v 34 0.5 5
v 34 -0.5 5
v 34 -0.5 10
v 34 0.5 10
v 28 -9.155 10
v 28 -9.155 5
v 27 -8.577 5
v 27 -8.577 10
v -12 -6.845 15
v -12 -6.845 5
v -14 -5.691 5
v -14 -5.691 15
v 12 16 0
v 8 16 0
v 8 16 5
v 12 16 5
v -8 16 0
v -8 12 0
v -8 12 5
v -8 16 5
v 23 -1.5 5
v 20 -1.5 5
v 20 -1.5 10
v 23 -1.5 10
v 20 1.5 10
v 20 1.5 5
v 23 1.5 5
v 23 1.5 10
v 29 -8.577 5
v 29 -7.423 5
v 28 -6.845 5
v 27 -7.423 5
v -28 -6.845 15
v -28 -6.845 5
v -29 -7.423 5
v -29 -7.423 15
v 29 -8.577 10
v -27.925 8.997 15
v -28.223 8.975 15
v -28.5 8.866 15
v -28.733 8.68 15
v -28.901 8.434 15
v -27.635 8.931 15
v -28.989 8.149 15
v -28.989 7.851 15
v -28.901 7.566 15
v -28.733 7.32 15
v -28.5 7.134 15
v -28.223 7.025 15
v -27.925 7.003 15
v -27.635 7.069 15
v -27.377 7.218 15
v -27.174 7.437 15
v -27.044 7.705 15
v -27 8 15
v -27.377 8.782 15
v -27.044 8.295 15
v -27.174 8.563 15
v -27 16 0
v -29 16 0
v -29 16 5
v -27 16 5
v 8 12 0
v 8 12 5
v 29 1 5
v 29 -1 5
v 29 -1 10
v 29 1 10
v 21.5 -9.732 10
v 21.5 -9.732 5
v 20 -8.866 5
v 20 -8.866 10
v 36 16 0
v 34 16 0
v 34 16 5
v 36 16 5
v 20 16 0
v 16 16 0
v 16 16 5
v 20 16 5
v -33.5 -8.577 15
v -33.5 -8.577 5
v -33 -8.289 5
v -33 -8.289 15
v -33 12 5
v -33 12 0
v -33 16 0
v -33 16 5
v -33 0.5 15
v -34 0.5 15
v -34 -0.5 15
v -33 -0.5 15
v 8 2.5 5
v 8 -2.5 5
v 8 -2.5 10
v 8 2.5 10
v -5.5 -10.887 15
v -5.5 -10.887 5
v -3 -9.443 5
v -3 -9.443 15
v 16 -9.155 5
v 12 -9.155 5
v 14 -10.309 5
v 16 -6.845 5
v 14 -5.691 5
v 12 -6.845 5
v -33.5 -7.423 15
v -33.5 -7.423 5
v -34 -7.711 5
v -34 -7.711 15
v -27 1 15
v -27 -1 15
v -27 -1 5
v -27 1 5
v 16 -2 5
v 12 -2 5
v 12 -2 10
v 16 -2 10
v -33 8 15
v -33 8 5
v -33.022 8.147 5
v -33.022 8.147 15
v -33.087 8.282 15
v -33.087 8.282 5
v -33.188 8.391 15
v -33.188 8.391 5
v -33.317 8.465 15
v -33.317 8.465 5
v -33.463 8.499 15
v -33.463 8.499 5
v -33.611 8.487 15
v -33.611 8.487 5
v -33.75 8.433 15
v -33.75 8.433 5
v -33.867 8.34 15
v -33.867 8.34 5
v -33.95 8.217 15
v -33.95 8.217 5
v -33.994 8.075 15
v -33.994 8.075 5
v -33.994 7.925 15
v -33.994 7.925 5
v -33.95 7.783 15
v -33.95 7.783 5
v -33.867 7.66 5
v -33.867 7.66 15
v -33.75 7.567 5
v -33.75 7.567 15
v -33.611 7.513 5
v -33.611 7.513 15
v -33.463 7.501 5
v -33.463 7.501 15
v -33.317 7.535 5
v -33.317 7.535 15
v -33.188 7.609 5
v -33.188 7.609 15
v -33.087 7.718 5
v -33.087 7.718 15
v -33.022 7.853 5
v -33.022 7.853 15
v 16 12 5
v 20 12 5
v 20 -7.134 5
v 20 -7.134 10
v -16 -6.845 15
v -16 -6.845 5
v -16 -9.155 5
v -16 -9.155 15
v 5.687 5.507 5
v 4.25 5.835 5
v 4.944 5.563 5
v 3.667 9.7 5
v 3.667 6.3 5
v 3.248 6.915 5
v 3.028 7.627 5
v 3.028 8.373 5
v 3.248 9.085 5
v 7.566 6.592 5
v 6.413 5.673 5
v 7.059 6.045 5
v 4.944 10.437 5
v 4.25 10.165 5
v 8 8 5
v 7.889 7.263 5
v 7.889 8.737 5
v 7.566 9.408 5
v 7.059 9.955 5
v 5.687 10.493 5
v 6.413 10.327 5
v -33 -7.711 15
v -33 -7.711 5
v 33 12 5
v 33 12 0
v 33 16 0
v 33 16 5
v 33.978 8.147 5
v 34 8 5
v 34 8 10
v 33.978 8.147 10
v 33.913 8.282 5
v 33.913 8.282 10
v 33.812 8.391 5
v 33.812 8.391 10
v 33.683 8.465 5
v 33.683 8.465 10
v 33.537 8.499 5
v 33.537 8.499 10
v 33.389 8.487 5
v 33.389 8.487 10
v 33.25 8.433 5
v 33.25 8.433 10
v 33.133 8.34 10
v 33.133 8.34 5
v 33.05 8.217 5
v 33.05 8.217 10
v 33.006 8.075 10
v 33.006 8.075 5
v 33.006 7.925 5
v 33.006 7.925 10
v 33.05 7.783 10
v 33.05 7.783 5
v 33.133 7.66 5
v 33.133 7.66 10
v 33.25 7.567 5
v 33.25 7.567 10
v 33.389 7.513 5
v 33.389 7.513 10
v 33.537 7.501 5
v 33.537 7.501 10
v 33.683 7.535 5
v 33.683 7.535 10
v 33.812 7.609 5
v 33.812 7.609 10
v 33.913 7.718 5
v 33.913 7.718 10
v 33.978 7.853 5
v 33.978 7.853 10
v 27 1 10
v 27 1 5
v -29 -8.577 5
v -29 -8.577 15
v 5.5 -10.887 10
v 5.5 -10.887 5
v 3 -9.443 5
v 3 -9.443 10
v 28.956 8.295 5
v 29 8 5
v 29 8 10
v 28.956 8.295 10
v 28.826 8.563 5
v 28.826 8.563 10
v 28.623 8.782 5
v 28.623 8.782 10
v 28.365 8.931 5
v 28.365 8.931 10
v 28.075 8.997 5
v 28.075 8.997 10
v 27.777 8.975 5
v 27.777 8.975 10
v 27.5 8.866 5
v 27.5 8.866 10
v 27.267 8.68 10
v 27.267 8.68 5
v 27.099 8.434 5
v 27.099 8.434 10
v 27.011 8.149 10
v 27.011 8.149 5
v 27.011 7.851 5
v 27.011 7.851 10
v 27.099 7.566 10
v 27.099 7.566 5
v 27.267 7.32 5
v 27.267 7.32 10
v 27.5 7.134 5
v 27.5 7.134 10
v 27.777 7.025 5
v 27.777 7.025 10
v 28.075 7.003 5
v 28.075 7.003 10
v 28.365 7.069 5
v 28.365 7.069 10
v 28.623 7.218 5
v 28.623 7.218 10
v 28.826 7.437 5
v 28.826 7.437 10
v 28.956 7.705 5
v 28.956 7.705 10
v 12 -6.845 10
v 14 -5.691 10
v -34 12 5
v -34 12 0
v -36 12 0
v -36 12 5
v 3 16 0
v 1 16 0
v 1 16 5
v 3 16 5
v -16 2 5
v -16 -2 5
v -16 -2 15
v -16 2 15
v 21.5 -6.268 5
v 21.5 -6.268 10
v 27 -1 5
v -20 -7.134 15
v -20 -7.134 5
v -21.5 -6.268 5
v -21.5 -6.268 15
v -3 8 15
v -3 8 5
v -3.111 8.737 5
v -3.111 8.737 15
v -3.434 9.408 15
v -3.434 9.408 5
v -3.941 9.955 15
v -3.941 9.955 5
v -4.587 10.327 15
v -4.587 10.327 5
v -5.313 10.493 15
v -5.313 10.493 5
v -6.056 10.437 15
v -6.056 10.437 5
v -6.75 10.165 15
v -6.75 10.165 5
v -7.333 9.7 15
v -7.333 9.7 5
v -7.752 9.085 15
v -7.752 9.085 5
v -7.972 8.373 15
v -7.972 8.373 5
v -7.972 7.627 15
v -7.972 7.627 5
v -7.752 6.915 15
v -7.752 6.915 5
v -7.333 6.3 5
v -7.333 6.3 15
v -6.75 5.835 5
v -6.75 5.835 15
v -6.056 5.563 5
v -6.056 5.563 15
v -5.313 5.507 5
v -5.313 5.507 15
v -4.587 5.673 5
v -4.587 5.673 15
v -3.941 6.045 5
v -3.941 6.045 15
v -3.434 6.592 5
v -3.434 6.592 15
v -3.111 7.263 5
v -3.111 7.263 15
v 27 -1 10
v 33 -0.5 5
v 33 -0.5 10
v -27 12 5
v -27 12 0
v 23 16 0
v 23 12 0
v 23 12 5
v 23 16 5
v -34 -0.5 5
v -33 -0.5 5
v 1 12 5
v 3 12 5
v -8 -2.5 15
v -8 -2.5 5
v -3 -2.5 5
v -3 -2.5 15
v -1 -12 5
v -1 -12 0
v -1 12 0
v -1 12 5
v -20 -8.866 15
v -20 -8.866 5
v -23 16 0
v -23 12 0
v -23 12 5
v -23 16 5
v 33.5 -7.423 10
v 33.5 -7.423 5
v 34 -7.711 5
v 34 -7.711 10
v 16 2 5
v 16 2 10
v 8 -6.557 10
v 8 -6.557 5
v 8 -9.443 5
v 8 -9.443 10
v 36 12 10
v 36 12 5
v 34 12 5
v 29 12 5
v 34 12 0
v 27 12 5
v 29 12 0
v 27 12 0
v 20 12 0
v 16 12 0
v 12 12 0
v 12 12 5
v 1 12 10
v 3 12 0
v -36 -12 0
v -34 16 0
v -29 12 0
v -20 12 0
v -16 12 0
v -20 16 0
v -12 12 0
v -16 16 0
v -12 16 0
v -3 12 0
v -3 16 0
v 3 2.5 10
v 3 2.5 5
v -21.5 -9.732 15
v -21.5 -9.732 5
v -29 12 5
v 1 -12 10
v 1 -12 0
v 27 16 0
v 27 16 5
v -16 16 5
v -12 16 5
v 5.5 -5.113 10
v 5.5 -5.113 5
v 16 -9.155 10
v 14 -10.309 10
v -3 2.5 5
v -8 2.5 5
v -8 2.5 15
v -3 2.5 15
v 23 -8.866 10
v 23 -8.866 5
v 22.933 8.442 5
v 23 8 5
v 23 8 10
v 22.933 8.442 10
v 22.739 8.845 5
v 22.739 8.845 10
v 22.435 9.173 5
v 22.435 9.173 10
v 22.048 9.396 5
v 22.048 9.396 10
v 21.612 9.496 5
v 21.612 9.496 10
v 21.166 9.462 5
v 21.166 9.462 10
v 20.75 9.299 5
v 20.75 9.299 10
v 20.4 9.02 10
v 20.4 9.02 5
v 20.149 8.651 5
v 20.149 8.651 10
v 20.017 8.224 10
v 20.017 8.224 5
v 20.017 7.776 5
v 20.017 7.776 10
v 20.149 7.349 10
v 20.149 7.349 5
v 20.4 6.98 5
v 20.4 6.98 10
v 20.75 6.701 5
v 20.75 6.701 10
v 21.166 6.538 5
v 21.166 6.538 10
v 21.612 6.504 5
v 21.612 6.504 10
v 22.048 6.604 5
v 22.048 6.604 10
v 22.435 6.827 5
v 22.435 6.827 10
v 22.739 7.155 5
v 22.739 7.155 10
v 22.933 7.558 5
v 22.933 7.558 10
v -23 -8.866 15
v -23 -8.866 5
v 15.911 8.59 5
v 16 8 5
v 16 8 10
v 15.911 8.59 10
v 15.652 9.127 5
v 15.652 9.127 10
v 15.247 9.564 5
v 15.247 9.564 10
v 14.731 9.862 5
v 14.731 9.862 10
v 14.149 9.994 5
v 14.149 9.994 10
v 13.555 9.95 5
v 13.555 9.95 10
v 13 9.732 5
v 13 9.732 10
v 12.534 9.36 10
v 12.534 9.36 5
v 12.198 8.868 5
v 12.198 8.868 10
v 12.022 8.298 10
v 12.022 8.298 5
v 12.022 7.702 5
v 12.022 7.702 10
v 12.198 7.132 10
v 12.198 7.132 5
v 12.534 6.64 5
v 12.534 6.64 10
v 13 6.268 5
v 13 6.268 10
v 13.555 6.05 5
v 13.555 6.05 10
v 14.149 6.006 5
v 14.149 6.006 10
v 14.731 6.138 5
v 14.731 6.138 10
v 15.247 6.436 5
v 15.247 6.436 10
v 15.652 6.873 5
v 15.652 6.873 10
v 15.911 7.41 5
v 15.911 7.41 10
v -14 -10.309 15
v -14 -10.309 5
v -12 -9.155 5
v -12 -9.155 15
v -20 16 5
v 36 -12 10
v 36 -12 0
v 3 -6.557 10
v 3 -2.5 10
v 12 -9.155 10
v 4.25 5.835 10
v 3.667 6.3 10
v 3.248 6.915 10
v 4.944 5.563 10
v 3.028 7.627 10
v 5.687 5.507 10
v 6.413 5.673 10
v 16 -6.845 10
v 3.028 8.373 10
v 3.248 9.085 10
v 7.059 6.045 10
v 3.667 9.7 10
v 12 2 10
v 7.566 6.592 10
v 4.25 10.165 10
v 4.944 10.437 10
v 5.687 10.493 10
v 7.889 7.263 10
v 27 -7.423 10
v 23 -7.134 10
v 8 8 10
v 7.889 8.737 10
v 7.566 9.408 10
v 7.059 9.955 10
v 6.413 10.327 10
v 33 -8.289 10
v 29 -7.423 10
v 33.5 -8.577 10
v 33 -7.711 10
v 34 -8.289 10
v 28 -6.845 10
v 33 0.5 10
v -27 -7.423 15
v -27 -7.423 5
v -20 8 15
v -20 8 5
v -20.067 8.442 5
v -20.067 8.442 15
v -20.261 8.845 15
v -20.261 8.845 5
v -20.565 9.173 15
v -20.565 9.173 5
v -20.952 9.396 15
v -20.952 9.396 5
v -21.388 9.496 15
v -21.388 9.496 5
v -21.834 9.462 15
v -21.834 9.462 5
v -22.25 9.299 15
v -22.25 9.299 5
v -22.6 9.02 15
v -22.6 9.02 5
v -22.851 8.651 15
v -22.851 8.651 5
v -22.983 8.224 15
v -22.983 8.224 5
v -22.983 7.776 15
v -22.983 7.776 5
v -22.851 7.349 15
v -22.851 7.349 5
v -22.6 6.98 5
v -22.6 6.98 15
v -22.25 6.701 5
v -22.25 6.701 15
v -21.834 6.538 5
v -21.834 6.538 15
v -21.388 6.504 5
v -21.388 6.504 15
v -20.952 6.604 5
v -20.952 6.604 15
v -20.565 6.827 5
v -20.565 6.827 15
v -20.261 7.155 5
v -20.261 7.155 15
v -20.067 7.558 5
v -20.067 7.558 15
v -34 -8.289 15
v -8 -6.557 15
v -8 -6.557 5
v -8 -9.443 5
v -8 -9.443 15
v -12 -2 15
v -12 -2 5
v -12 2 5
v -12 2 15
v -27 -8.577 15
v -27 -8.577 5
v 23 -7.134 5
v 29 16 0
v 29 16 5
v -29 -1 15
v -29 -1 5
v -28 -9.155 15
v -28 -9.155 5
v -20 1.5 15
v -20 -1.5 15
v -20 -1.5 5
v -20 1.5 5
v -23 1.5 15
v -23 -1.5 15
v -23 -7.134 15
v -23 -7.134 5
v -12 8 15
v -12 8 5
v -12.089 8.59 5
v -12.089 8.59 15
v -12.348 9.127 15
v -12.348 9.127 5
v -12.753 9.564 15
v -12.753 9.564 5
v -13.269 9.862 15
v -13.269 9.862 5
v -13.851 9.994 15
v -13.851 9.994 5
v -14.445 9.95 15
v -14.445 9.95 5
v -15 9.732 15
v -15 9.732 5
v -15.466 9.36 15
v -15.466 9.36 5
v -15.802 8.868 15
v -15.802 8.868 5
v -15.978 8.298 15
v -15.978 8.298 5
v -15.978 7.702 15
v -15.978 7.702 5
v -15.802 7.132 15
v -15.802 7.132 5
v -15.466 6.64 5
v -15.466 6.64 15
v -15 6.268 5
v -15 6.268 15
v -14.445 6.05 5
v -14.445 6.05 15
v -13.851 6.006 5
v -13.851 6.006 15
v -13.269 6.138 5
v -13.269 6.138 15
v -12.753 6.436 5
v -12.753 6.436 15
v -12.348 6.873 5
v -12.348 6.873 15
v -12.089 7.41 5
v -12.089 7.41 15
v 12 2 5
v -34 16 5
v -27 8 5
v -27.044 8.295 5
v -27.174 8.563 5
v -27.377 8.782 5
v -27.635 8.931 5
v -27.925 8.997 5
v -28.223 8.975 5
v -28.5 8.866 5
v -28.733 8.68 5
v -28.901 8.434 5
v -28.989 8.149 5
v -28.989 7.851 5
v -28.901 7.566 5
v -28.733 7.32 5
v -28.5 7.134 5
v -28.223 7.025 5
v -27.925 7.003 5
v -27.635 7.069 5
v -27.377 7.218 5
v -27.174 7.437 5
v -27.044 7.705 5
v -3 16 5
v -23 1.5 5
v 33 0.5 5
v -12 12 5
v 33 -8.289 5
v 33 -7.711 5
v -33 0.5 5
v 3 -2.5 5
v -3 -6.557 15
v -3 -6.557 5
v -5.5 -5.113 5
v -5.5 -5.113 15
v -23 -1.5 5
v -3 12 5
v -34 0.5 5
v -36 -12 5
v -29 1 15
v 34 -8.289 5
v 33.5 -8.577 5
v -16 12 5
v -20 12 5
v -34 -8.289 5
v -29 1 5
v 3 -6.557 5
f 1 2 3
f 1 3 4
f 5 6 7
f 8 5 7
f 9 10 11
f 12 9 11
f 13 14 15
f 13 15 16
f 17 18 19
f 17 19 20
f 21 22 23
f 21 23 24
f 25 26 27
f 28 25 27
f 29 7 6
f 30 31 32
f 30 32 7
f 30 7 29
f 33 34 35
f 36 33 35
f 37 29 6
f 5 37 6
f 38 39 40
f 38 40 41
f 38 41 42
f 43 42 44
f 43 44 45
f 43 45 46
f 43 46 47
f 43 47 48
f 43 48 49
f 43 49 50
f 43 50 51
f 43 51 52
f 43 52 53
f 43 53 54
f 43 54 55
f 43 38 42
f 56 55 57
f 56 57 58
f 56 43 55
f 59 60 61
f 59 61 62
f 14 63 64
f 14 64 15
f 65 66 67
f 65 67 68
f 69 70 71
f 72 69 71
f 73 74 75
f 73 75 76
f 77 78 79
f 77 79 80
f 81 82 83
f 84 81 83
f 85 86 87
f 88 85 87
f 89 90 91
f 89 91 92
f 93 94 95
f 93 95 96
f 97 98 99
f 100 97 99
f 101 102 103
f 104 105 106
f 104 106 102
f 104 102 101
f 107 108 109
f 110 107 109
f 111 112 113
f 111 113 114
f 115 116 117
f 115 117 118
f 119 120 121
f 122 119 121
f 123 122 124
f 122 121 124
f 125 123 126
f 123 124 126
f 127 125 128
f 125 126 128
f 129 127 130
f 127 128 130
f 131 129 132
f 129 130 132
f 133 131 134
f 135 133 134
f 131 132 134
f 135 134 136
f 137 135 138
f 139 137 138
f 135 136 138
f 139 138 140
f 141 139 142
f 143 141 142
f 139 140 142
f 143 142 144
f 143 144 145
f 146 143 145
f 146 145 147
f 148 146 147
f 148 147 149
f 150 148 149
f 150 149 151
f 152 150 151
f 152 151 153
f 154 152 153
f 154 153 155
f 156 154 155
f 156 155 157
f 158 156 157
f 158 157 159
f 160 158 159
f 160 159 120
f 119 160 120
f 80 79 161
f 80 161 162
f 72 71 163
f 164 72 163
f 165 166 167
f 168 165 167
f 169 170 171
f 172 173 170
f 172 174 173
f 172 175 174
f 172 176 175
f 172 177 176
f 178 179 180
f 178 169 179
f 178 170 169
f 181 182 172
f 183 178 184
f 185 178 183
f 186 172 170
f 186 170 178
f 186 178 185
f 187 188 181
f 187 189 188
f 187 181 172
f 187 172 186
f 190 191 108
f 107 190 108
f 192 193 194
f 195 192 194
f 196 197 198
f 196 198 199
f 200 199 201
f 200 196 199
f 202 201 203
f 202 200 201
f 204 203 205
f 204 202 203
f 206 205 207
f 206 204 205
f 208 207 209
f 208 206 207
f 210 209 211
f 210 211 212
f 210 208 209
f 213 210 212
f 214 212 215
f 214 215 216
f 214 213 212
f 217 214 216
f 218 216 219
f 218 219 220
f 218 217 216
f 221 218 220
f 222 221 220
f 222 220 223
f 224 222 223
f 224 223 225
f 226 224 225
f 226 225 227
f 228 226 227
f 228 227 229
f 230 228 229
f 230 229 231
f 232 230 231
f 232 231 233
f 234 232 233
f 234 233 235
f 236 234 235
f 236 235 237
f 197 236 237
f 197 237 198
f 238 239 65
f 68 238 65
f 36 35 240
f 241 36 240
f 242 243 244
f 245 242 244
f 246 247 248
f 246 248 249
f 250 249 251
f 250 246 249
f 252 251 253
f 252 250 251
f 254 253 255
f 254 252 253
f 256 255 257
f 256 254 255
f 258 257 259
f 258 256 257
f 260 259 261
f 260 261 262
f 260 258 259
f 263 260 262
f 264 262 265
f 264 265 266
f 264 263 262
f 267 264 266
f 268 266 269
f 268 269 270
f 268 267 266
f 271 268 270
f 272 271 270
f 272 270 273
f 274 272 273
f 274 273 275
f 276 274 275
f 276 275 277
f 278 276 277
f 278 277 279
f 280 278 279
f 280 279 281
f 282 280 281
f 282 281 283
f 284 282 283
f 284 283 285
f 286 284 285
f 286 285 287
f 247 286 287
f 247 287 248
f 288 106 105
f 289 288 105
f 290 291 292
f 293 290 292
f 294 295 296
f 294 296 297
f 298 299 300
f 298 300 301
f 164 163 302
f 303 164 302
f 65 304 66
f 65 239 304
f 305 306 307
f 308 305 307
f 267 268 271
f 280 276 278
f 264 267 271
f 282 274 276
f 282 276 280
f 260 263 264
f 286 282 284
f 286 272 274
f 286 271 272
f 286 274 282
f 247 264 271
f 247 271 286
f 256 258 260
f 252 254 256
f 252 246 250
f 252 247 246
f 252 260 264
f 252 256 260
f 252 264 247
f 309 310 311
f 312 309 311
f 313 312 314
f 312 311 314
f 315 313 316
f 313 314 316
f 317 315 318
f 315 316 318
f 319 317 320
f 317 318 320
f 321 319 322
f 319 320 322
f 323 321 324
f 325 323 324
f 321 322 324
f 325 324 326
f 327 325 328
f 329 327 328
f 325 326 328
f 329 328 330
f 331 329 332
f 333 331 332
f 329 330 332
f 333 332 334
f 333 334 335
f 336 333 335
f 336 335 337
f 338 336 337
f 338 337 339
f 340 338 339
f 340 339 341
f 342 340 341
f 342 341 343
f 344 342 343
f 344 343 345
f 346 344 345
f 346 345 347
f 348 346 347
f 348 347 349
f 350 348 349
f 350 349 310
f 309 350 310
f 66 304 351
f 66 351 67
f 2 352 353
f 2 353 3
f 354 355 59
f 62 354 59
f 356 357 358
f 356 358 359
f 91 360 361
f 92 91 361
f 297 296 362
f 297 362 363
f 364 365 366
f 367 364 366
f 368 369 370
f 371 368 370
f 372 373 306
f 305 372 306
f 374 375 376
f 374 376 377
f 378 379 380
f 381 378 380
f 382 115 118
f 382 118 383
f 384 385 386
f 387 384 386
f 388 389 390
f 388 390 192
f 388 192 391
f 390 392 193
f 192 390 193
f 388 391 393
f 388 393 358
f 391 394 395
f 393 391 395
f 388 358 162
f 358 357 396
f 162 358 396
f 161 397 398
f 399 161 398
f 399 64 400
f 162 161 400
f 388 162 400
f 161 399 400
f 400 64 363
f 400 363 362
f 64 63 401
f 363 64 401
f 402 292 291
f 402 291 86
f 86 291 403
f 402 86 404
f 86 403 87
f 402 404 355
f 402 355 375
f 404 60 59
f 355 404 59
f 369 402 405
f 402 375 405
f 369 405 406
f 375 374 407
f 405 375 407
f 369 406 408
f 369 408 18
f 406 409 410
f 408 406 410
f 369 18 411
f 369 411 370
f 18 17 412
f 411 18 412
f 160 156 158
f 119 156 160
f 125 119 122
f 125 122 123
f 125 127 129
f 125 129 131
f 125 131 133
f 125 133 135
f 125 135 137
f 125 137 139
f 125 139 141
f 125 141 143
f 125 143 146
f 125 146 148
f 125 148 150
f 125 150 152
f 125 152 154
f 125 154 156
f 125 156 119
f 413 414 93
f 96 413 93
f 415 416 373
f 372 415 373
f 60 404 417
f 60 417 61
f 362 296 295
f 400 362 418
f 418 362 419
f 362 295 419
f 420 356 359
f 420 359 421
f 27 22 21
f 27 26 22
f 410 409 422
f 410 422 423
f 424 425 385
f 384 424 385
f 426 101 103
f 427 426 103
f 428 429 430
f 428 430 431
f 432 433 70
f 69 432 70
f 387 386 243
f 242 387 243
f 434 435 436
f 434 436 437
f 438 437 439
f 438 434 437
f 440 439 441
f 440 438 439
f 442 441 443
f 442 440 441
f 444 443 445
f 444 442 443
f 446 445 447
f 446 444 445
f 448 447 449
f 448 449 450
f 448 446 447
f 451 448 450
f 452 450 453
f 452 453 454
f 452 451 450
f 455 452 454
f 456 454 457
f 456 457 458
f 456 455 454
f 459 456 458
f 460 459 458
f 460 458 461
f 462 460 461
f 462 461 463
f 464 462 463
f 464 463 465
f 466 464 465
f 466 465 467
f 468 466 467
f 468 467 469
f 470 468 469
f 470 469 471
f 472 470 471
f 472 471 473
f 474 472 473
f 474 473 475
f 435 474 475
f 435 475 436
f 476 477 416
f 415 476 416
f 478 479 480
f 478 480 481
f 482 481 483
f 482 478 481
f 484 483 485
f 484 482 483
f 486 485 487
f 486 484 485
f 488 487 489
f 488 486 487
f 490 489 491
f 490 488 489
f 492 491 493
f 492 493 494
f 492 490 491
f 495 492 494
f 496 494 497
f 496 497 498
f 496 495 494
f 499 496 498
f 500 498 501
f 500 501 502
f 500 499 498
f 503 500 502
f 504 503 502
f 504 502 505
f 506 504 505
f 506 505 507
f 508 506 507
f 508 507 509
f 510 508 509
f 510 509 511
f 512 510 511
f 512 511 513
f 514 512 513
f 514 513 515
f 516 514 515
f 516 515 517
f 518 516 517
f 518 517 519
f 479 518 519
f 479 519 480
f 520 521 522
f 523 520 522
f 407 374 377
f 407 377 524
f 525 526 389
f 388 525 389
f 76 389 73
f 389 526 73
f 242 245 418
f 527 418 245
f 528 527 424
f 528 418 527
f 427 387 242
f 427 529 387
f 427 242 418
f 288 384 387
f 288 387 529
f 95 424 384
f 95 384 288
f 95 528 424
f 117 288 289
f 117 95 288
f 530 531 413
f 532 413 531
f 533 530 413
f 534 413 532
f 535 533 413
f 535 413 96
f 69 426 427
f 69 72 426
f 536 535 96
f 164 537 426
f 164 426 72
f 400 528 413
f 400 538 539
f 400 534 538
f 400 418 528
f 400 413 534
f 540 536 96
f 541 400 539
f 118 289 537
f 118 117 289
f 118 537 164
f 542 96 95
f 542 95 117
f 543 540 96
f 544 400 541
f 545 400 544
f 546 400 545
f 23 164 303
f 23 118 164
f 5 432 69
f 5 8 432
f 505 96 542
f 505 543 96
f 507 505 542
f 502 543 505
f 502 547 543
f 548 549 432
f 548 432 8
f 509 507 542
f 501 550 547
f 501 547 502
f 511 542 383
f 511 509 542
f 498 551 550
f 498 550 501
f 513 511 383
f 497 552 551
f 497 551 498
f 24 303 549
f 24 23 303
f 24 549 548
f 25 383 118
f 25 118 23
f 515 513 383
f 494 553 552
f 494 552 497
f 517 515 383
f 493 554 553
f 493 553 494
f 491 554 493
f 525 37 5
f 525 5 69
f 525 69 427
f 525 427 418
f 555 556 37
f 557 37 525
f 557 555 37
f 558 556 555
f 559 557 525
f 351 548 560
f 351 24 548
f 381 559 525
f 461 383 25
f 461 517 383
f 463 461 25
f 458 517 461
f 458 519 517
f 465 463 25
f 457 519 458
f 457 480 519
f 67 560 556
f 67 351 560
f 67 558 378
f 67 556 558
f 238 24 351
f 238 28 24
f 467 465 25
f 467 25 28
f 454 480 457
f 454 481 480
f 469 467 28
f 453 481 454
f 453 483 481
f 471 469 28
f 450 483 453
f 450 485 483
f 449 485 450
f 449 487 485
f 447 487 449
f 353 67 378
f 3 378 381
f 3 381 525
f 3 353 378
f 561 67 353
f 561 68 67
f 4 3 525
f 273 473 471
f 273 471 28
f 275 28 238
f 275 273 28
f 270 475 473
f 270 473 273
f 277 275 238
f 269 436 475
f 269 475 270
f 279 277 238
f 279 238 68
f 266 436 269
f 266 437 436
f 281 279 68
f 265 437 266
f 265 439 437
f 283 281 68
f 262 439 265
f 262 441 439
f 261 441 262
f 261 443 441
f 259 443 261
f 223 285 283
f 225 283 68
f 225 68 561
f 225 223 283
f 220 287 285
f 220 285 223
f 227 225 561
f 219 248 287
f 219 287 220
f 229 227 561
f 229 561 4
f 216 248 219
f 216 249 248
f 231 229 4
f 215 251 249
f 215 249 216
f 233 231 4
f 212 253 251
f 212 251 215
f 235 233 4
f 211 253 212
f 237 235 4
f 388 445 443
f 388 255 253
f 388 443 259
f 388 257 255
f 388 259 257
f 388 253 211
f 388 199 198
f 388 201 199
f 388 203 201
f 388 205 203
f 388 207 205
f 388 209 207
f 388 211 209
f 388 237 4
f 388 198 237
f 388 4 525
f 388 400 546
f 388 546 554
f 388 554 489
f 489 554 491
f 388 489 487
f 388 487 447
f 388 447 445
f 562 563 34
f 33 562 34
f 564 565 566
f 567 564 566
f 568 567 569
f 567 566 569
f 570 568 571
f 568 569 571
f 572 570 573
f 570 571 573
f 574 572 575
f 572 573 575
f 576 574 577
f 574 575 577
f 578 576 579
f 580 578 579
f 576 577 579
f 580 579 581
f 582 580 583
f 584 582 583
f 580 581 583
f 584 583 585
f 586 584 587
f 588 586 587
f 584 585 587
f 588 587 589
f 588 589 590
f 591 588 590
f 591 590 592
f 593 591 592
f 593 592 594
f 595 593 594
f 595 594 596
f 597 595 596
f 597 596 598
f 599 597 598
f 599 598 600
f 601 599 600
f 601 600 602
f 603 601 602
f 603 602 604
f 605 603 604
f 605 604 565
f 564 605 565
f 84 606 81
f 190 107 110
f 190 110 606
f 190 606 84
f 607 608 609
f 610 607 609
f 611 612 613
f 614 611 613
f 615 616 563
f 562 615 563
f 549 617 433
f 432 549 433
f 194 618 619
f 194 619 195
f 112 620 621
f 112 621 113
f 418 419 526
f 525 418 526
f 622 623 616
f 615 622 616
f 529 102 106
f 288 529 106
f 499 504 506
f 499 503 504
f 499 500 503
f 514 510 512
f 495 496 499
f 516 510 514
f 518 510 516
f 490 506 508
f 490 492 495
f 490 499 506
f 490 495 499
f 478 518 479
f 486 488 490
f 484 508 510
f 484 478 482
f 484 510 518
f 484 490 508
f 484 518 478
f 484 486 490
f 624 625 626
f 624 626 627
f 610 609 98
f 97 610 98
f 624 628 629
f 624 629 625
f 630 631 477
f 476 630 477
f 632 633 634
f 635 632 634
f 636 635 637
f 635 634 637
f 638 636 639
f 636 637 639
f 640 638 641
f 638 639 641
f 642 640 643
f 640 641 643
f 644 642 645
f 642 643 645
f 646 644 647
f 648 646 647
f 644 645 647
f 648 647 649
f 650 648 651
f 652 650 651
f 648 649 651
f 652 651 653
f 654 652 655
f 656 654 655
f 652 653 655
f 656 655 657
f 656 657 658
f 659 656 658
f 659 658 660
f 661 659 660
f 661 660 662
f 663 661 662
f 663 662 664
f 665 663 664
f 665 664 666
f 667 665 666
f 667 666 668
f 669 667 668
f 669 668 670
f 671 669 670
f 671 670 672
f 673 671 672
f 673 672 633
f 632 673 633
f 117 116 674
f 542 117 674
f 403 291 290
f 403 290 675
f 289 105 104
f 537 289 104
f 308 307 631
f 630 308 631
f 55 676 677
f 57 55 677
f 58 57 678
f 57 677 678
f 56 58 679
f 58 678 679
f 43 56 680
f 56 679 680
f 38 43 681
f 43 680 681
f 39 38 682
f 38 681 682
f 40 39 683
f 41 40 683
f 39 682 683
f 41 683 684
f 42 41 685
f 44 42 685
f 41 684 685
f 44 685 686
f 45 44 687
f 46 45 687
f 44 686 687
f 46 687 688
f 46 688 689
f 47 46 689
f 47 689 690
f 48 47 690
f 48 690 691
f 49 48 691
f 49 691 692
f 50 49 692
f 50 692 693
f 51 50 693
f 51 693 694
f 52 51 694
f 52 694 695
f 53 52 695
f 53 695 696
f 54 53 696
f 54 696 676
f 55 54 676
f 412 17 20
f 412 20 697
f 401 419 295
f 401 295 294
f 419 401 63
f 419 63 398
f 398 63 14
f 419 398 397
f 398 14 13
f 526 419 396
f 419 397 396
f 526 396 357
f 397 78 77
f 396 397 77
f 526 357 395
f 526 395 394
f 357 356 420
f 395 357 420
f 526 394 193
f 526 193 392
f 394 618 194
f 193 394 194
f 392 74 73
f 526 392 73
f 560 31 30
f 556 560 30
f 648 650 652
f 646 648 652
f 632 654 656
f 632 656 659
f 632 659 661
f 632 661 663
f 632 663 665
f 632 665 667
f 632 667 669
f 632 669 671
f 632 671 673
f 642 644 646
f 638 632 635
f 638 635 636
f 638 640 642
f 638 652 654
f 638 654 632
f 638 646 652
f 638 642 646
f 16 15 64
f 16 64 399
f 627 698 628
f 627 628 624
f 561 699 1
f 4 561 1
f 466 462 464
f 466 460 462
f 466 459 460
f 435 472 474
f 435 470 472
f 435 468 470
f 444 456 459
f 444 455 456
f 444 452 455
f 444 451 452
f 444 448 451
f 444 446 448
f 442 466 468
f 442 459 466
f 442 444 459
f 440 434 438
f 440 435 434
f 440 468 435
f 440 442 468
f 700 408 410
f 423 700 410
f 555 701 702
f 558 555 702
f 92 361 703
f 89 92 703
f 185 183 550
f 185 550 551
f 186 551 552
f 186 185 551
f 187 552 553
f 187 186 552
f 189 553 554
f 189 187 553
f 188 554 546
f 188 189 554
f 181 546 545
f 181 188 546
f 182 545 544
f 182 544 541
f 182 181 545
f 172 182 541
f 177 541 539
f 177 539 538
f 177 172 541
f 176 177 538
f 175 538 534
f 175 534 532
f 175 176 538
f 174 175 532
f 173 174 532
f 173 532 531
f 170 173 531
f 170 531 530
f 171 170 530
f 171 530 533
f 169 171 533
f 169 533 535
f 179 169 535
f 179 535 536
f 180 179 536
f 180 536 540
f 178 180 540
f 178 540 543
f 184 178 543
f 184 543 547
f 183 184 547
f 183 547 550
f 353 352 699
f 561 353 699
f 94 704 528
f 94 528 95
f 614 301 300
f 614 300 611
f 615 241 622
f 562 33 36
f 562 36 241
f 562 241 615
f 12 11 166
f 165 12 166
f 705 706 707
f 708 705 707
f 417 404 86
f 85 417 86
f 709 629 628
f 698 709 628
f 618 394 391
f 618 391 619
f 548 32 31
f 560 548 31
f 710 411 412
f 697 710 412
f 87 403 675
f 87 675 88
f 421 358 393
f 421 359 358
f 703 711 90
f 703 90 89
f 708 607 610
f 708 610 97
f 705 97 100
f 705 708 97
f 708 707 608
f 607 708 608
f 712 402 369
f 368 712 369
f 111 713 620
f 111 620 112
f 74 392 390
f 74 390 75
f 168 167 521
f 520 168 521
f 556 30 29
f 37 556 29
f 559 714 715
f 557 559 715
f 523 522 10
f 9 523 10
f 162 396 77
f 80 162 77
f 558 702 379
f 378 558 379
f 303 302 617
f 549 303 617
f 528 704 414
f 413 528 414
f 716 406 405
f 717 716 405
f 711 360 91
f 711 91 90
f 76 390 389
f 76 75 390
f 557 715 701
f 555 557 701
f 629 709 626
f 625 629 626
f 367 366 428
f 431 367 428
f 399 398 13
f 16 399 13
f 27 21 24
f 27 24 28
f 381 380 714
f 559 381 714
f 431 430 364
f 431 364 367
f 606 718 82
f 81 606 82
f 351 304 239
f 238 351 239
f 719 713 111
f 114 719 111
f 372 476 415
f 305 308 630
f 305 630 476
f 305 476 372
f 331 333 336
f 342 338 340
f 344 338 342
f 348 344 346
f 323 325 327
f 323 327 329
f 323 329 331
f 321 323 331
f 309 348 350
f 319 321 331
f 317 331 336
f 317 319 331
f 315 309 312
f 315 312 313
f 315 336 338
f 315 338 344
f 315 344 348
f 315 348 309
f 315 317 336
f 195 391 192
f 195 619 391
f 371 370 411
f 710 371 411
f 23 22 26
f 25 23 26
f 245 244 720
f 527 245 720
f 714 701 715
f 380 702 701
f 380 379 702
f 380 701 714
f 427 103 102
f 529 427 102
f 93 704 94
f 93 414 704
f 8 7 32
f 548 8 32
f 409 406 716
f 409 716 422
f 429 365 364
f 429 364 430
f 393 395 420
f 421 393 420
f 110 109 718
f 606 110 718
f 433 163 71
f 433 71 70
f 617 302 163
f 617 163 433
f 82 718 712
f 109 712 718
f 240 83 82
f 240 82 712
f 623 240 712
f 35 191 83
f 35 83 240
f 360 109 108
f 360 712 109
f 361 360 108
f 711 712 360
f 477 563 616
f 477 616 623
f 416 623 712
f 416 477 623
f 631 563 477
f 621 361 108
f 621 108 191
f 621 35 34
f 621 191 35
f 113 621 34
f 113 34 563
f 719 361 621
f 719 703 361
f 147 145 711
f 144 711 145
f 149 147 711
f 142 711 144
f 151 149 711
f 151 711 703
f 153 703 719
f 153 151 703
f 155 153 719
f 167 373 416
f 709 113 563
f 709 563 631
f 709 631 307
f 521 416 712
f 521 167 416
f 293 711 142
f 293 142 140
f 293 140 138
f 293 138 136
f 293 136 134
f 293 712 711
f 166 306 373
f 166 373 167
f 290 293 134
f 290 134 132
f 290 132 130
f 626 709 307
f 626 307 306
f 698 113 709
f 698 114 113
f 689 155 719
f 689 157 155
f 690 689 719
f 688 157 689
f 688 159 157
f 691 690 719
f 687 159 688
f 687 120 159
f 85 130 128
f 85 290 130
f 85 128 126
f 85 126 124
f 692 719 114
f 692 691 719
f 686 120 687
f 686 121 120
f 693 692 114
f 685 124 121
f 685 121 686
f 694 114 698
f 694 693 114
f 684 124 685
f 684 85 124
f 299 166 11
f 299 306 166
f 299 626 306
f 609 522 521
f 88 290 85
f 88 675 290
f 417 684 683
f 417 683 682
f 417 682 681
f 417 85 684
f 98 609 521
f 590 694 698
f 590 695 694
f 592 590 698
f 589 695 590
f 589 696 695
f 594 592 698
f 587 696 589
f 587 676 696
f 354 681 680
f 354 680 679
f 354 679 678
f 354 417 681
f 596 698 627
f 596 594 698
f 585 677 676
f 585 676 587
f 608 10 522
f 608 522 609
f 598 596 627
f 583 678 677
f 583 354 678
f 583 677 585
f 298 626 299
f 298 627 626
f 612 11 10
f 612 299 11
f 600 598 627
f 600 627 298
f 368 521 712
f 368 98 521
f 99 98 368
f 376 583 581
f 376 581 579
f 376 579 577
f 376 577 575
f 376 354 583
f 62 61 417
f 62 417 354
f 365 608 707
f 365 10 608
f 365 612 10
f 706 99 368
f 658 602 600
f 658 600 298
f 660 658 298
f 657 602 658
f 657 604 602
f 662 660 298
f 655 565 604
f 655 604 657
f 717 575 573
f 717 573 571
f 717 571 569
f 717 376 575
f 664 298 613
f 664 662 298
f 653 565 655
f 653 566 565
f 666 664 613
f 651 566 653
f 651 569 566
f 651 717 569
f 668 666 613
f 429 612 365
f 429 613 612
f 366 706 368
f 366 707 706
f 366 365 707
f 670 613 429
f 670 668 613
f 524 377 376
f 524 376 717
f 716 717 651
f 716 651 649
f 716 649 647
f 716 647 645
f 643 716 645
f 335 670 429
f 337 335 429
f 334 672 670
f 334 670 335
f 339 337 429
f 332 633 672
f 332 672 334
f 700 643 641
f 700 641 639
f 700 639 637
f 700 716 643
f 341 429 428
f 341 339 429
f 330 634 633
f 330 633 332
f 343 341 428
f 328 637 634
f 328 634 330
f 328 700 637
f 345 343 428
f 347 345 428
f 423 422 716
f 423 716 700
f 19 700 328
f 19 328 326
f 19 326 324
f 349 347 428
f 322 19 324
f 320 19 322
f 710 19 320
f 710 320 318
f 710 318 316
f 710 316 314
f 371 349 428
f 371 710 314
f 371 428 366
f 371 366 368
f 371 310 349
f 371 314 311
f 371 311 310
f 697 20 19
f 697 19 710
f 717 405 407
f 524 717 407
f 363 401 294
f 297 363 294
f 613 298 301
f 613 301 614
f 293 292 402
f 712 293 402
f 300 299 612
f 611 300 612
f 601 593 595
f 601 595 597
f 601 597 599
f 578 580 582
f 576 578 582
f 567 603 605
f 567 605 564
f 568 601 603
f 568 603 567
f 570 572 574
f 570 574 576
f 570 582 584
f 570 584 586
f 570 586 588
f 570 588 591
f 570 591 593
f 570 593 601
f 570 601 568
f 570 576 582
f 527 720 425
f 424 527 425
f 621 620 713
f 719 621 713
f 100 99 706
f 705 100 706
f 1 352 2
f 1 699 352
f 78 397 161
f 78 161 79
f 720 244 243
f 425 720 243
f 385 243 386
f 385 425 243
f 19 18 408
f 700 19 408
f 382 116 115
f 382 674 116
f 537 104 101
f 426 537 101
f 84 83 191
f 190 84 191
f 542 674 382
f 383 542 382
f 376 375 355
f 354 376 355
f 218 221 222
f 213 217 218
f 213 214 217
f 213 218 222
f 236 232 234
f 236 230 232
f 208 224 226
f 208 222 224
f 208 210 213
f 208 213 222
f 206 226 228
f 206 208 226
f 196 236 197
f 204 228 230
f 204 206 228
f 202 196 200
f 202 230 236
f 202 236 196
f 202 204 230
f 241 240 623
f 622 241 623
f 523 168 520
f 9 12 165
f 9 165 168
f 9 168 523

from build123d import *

# Parameters (mm, degrees)
F0_W     = 5
F0_H     = 4
F0_W_2   = 4
F0_W_3   = 2
F0_W_4   = 3
F0_W_5   = 1
F0_H_2   = 1
F0_H_3   = 2
F0_H_4   = 3
F0_H_5   = 5
F0_R     = 0.5
F0_R_2   = 1
F0_R_3   = 1.5
F0_R_4   = 2
F0_R_5   = 2.5
F1_DEPTH = 5
F2_DEPTH = 10
F3_DEPTH = 15


with BuildPart() as f1:
    # F0 (on Top) → F1 (new body)
    with BuildSketch(Plane.XY):
        with Locations((-5.5, 14)):
            Rectangle(F0_W, F0_H)
        with Locations((-14, 14)):
            Rectangle(F0_W_2, F0_H)
        with Locations((-28, 14)):
            Rectangle(F0_W_3, F0_H)
        with Locations((-21.5, 14)):
            Rectangle(F0_W_4, F0_H)
        with Locations((-33.5, 14)):
            Rectangle(F0_W_5, F0_H)
        Polygon((-34, 12), (-36, 12), (-36, -12), (-1, -12), (-1, 12), (-3, 12), (-8, 12), (-12, 12), (-16, 12), (-20, 12), (-23, 12), (-27, 12), (-29, 12), (-33, 12), align=None)
        Polygon((-34, -7.7113248654), (-33.5, -7.4226497308), (-33, -7.7113248654), (-33, -8.2886751346), (-33.5, -8.5773502692), (-34, -8.2886751346), align=None, mode=Mode.SUBTRACT)
        Polygon((-29, -7.4226497308), (-28, -6.8452994616), (-27, -7.4226497308), (-27, -8.5773502692), (-28, -9.1547005384), (-29, -8.5773502692), align=None, mode=Mode.SUBTRACT)
        Polygon((-23, -7.1339745962), (-21.5, -6.2679491924), (-20, -7.1339745962), (-20, -8.8660254038), (-21.5, -9.7320508076), (-23, -8.8660254038), align=None, mode=Mode.SUBTRACT)
        with Locations((-33.5, 0)):
            Rectangle(F0_W_5, F0_H_2, mode=Mode.SUBTRACT)
        with Locations((-28, 0)):
            Rectangle(F0_W_3, F0_H_3, mode=Mode.SUBTRACT)
        with Locations((-21.5, 0)):
            Rectangle(F0_W_4, F0_H_4, mode=Mode.SUBTRACT)
        Polygon((-16, -6.8452994616), (-14, -5.6905989232), (-12, -6.8452994616), (-12, -9.1547005384), (-14, -10.3094010768), (-16, -9.1547005384), align=None, mode=Mode.SUBTRACT)
        Polygon((-8, -9.443375673), (-8, -6.556624327), (-5.5, -5.1132486541), (-3, -6.556624327), (-3, -9.443375673), (-5.5, -10.8867513459), align=None, mode=Mode.SUBTRACT)
        with Locations((-14, 0)):
            Rectangle(F0_W_2, F0_H, mode=Mode.SUBTRACT)
        with Locations((-5.5, 0)):
            Rectangle(F0_W, F0_H_5, mode=Mode.SUBTRACT)
        with Locations((-33.5, 8)):
            Circle(F0_R, mode=Mode.SUBTRACT)
        with Locations((-28, 8)):
            Circle(F0_R_2, mode=Mode.SUBTRACT)
        with Locations((-21.5, 8)):
            Circle(F0_R_3, mode=Mode.SUBTRACT)
        with Locations((-14, 8)):
            Circle(F0_R_4, mode=Mode.SUBTRACT)
        with Locations((-5.5, 8)):
            Circle(F0_R_5, mode=Mode.SUBTRACT)
        Polygon((-12, -6.8452994616), (-14, -5.6905989232), (-16, -6.8452994616), (-16, -9.1547005384), (-14, -10.3094010768), (-12, -9.1547005384), align=None)
        Polygon((-20, -7.1339745962), (-21.5, -6.2679491924), (-23, -7.1339745962), (-23, -8.8660254038), (-21.5, -9.7320508076), (-20, -8.8660254038), align=None)
        with Locations((-5.5, 0)):
            Rectangle(F0_W, F0_H_5)
        with Locations((-28, 0)):
            Rectangle(F0_W_3, F0_H_3)
        with Locations((-14, 0)):
            Rectangle(F0_W_2, F0_H)
        with Locations((-21.5, 0)):
            Rectangle(F0_W_4, F0_H_4)
        with Locations((-28, 8)):
            Circle(F0_R_2)
        Polygon((-27, -7.4226497308), (-28, -6.8452994616), (-29, -7.4226497308), (-29, -8.5773502692), (-28, -9.1547005384), (-27, -8.5773502692), align=None)
        with Locations((-33.5, 8)):
            Circle(F0_R)
        Polygon((-33, -7.7113248654), (-33.5, -7.4226497308), (-34, -7.7113248654), (-34, -8.2886751346), (-33.5, -8.5773502692), (-33, -8.2886751346), align=None)
        with Locations((-33.5, 0)):
            Rectangle(F0_W_5, F0_H_2)
        with Locations((-5.5, 8)):
            Circle(F0_R_5)
        with Locations((-14, 8)):
            Circle(F0_R_4)
        with Locations((-21.5, 8)):
            Circle(F0_R_3)
        Polygon((-5.5, -5.1132486541), (-8, -6.556624327), (-8, -9.443375673), (-5.5, -10.8867513459), (-3, -9.443375673), (-3, -6.556624327), align=None)
    extrude(amount=F1_DEPTH)

    # F0 (on Top) → F3 (join)
    with BuildSketch(Plane.XY):
        with Locations((-21.5, 0)):
            Rectangle(F0_W_4, F0_H_4)
        with Locations((-28, 8)):
            Circle(F0_R_2)
        with Locations((-21.5, 8)):
            Circle(F0_R_3)
        Polygon((-5.5, -5.1132486541), (-8, -6.556624327), (-8, -9.443375673), (-5.5, -10.8867513459), (-3, -9.443375673), (-3, -6.556624327), align=None)
        Polygon((-27, -7.4226497308), (-28, -6.8452994616), (-29, -7.4226497308), (-29, -8.5773502692), (-28, -9.1547005384), (-27, -8.5773502692), align=None)
        with Locations((-5.5, 0)):
            Rectangle(F0_W, F0_H_5)
        with Locations((-14, 8)):
            Circle(F0_R_4)
        with Locations((-28, 0)):
            Rectangle(F0_W_3, F0_H_3)
        Polygon((-12, -6.8452994616), (-14, -5.6905989232), (-16, -6.8452994616), (-16, -9.1547005384), (-14, -10.3094010768), (-12, -9.1547005384), align=None)
        with Locations((-14, 0)):
            Rectangle(F0_W_2, F0_H)
        Polygon((-20, -7.1339745962), (-21.5, -6.2679491924), (-23, -7.1339745962), (-23, -8.8660254038), (-21.5, -9.7320508076), (-20, -8.8660254038), align=None)
        with Locations((-5.5, 8)):
            Circle(F0_R_5)
        with Locations((-33.5, 0)):
            Rectangle(F0_W_5, F0_H_2)
        with Locations((-33.5, 8)):
            Circle(F0_R)
        Polygon((-33, -7.7113248654), (-33.5, -7.4226497308), (-34, -7.7113248654), (-34, -8.2886751346), (-33.5, -8.5773502692), (-33, -8.2886751346), align=None)
    extrude(amount=F3_DEPTH)


with BuildPart() as f1b:
    # F0 (on Top) → F1, piece 2 (new body)
    with BuildSketch(Plane.XY):
        Polygon((1, 12), (1, -12), (36, -12), (36, 12), (34, 12), (33, 12), (29, 12), (27, 12), (23, 12), (20, 12), (16, 12), (12, 12), (8, 12), (3, 12), align=None)
        Polygon((5.5, -5.1132486541), (8, -6.556624327), (8, -9.443375673), (5.5, -10.8867513459), (3, -9.443375673), (3, -6.556624327), align=None, mode=Mode.SUBTRACT)
        Polygon((16, -6.8452994616), (16, -9.1547005384), (14, -10.3094010768), (12, -9.1547005384), (12, -6.8452994616), (14, -5.6905989232), align=None, mode=Mode.SUBTRACT)
        with Locations((5.5, 0)):
            Rectangle(F0_W, F0_H_5, mode=Mode.SUBTRACT)
        with Locations((14, 0)):
            Rectangle(F0_W_2, F0_H, mode=Mode.SUBTRACT)
        Polygon((20, -8.8660254038), (20, -7.1339745962), (21.5, -6.2679491924), (23, -7.1339745962), (23, -8.8660254038), (21.5, -9.7320508076), align=None, mode=Mode.SUBTRACT)
        Polygon((28, -9.1547005384), (27, -8.5773502692), (27, -7.4226497308), (28, -6.8452994616), (29, -7.4226497308), (29, -8.5773502692), align=None, mode=Mode.SUBTRACT)
        Polygon((33, -8.2886751346), (33, -7.7113248654), (33.5, -7.4226497308), (34, -7.7113248654), (34, -8.2886751346), (33.5, -8.5773502692), align=None, mode=Mode.SUBTRACT)
        with Locations((21.5, 0)):
            Rectangle(F0_W_4, F0_H_4, mode=Mode.SUBTRACT)
        with Locations((28, 0)):
            Rectangle(F0_W_3, F0_H_3, mode=Mode.SUBTRACT)
        with Locations((33.5, 0)):
            Rectangle(F0_W_5, F0_H_2, mode=Mode.SUBTRACT)
        with Locations((5.5, 8)):
            Circle(F0_R_5, mode=Mode.SUBTRACT)
        with Locations((14, 8)):
            Circle(F0_R_4, mode=Mode.SUBTRACT)
        with Locations((21.5, 8)):
            Circle(F0_R_3, mode=Mode.SUBTRACT)
        with Locations((28, 8)):
            Circle(F0_R_2, mode=Mode.SUBTRACT)
        with Locations((33.5, 8)):
            Circle(F0_R, mode=Mode.SUBTRACT)
        with Locations((5.5, 0)):
            Rectangle(F0_W, F0_H_5)
        Polygon((8, -9.443375673), (8, -6.556624327), (5.5, -5.1132486541), (3, -6.556624327), (3, -9.443375673), (5.5, -10.8867513459), align=None)
        with Locations((5.5, 8)):
            Circle(F0_R_5)
        with Locations((10, 14)):
            Rectangle(F0_W_2, F0_H)
        with Locations((14, 0)):
            Rectangle(F0_W_2, F0_H)
        with Locations((25, 14)):
            Rectangle(F0_W_2, F0_H)
        with Locations((31, 14)):
            Rectangle(F0_W_2, F0_H)
        with Locations((18, 14)):
            Rectangle(F0_W_2, F0_H)
        Polygon((14, -10.3094010768), (16, -9.1547005384), (16, -6.8452994616), (14, -5.6905989232), (12, -6.8452994616), (12, -9.1547005384), align=None)
        with Locations((14, 8)):
            Circle(F0_R_4)
        with Locations((21.5, 0)):
            Rectangle(F0_W_4, F0_H_4)
        with Locations((35, 14)):
            Rectangle(F0_W_3, F0_H)
        with Locations((2, 14)):
            Rectangle(F0_W_3, F0_H)
        Polygon((21.5, -6.2679491924), (20, -7.1339745962), (20, -8.8660254038), (21.5, -9.7320508076), (23, -8.8660254038), (23, -7.1339745962), align=None)
        with Locations((21.5, 8)):
            Circle(F0_R_3)
        with Locations((28, 0)):
            Rectangle(F0_W_3, F0_H_3)
        Polygon((27, -7.4226497308), (27, -8.5773502692), (28, -9.1547005384), (29, -8.5773502692), (29, -7.4226497308), (28, -6.8452994616), align=None)
        with Locations((28, 8)):
            Circle(F0_R_2)
        with Locations((33.5, 0)):
            Rectangle(F0_W_5, F0_H_2)
        Polygon((33.5, -7.4226497308), (33, -7.7113248654), (33, -8.2886751346), (33.5, -8.5773502692), (34, -8.2886751346), (34, -7.7113248654), align=None)
        with Locations((33.5, 8)):
            Circle(F0_R)
    extrude(amount=F1_DEPTH)

    # F0 (on Top) → F2 (join)
    with BuildSketch(Plane.XY):
        Polygon((1, 12), (1, -12), (36, -12), (36, 12), (34, 12), (33, 12), (29, 12), (27, 12), (23, 12), (20, 12), (16, 12), (12, 12), (8, 12), (3, 12), align=None)
        Polygon((5.5, -5.1132486541), (8, -6.556624327), (8, -9.443375673), (5.5, -10.8867513459), (3, -9.443375673), (3, -6.556624327), align=None, mode=Mode.SUBTRACT)
        Polygon((16, -6.8452994616), (16, -9.1547005384), (14, -10.3094010768), (12, -9.1547005384), (12, -6.8452994616), (14, -5.6905989232), align=None, mode=Mode.SUBTRACT)
        with Locations((5.5, 0)):
            Rectangle(F0_W, F0_H_5, mode=Mode.SUBTRACT)
        with Locations((14, 0)):
            Rectangle(F0_W_2, F0_H, mode=Mode.SUBTRACT)
        Polygon((20, -8.8660254038), (20, -7.1339745962), (21.5, -6.2679491924), (23, -7.1339745962), (23, -8.8660254038), (21.5, -9.7320508076), align=None, mode=Mode.SUBTRACT)
        Polygon((28, -9.1547005384), (27, -8.5773502692), (27, -7.4226497308), (28, -6.8452994616), (29, -7.4226497308), (29, -8.5773502692), align=None, mode=Mode.SUBTRACT)
        Polygon((33, -8.2886751346), (33, -7.7113248654), (33.5, -7.4226497308), (34, -7.7113248654), (34, -8.2886751346), (33.5, -8.5773502692), align=None, mode=Mode.SUBTRACT)
        with Locations((21.5, 0)):
            Rectangle(F0_W_4, F0_H_4, mode=Mode.SUBTRACT)
        with Locations((28, 0)):
            Rectangle(F0_W_3, F0_H_3, mode=Mode.SUBTRACT)
        with Locations((33.5, 0)):
            Rectangle(F0_W_5, F0_H_2, mode=Mode.SUBTRACT)
        with Locations((5.5, 8)):
            Circle(F0_R_5, mode=Mode.SUBTRACT)
        with Locations((14, 8)):
            Circle(F0_R_4, mode=Mode.SUBTRACT)
        with Locations((21.5, 8)):
            Circle(F0_R_3, mode=Mode.SUBTRACT)
        with Locations((28, 8)):
            Circle(F0_R_2, mode=Mode.SUBTRACT)
        with Locations((33.5, 8)):
            Circle(F0_R, mode=Mode.SUBTRACT)
    extrude(amount=F2_DEPTH)


solid = Compound([f1.part, f1b.part])
